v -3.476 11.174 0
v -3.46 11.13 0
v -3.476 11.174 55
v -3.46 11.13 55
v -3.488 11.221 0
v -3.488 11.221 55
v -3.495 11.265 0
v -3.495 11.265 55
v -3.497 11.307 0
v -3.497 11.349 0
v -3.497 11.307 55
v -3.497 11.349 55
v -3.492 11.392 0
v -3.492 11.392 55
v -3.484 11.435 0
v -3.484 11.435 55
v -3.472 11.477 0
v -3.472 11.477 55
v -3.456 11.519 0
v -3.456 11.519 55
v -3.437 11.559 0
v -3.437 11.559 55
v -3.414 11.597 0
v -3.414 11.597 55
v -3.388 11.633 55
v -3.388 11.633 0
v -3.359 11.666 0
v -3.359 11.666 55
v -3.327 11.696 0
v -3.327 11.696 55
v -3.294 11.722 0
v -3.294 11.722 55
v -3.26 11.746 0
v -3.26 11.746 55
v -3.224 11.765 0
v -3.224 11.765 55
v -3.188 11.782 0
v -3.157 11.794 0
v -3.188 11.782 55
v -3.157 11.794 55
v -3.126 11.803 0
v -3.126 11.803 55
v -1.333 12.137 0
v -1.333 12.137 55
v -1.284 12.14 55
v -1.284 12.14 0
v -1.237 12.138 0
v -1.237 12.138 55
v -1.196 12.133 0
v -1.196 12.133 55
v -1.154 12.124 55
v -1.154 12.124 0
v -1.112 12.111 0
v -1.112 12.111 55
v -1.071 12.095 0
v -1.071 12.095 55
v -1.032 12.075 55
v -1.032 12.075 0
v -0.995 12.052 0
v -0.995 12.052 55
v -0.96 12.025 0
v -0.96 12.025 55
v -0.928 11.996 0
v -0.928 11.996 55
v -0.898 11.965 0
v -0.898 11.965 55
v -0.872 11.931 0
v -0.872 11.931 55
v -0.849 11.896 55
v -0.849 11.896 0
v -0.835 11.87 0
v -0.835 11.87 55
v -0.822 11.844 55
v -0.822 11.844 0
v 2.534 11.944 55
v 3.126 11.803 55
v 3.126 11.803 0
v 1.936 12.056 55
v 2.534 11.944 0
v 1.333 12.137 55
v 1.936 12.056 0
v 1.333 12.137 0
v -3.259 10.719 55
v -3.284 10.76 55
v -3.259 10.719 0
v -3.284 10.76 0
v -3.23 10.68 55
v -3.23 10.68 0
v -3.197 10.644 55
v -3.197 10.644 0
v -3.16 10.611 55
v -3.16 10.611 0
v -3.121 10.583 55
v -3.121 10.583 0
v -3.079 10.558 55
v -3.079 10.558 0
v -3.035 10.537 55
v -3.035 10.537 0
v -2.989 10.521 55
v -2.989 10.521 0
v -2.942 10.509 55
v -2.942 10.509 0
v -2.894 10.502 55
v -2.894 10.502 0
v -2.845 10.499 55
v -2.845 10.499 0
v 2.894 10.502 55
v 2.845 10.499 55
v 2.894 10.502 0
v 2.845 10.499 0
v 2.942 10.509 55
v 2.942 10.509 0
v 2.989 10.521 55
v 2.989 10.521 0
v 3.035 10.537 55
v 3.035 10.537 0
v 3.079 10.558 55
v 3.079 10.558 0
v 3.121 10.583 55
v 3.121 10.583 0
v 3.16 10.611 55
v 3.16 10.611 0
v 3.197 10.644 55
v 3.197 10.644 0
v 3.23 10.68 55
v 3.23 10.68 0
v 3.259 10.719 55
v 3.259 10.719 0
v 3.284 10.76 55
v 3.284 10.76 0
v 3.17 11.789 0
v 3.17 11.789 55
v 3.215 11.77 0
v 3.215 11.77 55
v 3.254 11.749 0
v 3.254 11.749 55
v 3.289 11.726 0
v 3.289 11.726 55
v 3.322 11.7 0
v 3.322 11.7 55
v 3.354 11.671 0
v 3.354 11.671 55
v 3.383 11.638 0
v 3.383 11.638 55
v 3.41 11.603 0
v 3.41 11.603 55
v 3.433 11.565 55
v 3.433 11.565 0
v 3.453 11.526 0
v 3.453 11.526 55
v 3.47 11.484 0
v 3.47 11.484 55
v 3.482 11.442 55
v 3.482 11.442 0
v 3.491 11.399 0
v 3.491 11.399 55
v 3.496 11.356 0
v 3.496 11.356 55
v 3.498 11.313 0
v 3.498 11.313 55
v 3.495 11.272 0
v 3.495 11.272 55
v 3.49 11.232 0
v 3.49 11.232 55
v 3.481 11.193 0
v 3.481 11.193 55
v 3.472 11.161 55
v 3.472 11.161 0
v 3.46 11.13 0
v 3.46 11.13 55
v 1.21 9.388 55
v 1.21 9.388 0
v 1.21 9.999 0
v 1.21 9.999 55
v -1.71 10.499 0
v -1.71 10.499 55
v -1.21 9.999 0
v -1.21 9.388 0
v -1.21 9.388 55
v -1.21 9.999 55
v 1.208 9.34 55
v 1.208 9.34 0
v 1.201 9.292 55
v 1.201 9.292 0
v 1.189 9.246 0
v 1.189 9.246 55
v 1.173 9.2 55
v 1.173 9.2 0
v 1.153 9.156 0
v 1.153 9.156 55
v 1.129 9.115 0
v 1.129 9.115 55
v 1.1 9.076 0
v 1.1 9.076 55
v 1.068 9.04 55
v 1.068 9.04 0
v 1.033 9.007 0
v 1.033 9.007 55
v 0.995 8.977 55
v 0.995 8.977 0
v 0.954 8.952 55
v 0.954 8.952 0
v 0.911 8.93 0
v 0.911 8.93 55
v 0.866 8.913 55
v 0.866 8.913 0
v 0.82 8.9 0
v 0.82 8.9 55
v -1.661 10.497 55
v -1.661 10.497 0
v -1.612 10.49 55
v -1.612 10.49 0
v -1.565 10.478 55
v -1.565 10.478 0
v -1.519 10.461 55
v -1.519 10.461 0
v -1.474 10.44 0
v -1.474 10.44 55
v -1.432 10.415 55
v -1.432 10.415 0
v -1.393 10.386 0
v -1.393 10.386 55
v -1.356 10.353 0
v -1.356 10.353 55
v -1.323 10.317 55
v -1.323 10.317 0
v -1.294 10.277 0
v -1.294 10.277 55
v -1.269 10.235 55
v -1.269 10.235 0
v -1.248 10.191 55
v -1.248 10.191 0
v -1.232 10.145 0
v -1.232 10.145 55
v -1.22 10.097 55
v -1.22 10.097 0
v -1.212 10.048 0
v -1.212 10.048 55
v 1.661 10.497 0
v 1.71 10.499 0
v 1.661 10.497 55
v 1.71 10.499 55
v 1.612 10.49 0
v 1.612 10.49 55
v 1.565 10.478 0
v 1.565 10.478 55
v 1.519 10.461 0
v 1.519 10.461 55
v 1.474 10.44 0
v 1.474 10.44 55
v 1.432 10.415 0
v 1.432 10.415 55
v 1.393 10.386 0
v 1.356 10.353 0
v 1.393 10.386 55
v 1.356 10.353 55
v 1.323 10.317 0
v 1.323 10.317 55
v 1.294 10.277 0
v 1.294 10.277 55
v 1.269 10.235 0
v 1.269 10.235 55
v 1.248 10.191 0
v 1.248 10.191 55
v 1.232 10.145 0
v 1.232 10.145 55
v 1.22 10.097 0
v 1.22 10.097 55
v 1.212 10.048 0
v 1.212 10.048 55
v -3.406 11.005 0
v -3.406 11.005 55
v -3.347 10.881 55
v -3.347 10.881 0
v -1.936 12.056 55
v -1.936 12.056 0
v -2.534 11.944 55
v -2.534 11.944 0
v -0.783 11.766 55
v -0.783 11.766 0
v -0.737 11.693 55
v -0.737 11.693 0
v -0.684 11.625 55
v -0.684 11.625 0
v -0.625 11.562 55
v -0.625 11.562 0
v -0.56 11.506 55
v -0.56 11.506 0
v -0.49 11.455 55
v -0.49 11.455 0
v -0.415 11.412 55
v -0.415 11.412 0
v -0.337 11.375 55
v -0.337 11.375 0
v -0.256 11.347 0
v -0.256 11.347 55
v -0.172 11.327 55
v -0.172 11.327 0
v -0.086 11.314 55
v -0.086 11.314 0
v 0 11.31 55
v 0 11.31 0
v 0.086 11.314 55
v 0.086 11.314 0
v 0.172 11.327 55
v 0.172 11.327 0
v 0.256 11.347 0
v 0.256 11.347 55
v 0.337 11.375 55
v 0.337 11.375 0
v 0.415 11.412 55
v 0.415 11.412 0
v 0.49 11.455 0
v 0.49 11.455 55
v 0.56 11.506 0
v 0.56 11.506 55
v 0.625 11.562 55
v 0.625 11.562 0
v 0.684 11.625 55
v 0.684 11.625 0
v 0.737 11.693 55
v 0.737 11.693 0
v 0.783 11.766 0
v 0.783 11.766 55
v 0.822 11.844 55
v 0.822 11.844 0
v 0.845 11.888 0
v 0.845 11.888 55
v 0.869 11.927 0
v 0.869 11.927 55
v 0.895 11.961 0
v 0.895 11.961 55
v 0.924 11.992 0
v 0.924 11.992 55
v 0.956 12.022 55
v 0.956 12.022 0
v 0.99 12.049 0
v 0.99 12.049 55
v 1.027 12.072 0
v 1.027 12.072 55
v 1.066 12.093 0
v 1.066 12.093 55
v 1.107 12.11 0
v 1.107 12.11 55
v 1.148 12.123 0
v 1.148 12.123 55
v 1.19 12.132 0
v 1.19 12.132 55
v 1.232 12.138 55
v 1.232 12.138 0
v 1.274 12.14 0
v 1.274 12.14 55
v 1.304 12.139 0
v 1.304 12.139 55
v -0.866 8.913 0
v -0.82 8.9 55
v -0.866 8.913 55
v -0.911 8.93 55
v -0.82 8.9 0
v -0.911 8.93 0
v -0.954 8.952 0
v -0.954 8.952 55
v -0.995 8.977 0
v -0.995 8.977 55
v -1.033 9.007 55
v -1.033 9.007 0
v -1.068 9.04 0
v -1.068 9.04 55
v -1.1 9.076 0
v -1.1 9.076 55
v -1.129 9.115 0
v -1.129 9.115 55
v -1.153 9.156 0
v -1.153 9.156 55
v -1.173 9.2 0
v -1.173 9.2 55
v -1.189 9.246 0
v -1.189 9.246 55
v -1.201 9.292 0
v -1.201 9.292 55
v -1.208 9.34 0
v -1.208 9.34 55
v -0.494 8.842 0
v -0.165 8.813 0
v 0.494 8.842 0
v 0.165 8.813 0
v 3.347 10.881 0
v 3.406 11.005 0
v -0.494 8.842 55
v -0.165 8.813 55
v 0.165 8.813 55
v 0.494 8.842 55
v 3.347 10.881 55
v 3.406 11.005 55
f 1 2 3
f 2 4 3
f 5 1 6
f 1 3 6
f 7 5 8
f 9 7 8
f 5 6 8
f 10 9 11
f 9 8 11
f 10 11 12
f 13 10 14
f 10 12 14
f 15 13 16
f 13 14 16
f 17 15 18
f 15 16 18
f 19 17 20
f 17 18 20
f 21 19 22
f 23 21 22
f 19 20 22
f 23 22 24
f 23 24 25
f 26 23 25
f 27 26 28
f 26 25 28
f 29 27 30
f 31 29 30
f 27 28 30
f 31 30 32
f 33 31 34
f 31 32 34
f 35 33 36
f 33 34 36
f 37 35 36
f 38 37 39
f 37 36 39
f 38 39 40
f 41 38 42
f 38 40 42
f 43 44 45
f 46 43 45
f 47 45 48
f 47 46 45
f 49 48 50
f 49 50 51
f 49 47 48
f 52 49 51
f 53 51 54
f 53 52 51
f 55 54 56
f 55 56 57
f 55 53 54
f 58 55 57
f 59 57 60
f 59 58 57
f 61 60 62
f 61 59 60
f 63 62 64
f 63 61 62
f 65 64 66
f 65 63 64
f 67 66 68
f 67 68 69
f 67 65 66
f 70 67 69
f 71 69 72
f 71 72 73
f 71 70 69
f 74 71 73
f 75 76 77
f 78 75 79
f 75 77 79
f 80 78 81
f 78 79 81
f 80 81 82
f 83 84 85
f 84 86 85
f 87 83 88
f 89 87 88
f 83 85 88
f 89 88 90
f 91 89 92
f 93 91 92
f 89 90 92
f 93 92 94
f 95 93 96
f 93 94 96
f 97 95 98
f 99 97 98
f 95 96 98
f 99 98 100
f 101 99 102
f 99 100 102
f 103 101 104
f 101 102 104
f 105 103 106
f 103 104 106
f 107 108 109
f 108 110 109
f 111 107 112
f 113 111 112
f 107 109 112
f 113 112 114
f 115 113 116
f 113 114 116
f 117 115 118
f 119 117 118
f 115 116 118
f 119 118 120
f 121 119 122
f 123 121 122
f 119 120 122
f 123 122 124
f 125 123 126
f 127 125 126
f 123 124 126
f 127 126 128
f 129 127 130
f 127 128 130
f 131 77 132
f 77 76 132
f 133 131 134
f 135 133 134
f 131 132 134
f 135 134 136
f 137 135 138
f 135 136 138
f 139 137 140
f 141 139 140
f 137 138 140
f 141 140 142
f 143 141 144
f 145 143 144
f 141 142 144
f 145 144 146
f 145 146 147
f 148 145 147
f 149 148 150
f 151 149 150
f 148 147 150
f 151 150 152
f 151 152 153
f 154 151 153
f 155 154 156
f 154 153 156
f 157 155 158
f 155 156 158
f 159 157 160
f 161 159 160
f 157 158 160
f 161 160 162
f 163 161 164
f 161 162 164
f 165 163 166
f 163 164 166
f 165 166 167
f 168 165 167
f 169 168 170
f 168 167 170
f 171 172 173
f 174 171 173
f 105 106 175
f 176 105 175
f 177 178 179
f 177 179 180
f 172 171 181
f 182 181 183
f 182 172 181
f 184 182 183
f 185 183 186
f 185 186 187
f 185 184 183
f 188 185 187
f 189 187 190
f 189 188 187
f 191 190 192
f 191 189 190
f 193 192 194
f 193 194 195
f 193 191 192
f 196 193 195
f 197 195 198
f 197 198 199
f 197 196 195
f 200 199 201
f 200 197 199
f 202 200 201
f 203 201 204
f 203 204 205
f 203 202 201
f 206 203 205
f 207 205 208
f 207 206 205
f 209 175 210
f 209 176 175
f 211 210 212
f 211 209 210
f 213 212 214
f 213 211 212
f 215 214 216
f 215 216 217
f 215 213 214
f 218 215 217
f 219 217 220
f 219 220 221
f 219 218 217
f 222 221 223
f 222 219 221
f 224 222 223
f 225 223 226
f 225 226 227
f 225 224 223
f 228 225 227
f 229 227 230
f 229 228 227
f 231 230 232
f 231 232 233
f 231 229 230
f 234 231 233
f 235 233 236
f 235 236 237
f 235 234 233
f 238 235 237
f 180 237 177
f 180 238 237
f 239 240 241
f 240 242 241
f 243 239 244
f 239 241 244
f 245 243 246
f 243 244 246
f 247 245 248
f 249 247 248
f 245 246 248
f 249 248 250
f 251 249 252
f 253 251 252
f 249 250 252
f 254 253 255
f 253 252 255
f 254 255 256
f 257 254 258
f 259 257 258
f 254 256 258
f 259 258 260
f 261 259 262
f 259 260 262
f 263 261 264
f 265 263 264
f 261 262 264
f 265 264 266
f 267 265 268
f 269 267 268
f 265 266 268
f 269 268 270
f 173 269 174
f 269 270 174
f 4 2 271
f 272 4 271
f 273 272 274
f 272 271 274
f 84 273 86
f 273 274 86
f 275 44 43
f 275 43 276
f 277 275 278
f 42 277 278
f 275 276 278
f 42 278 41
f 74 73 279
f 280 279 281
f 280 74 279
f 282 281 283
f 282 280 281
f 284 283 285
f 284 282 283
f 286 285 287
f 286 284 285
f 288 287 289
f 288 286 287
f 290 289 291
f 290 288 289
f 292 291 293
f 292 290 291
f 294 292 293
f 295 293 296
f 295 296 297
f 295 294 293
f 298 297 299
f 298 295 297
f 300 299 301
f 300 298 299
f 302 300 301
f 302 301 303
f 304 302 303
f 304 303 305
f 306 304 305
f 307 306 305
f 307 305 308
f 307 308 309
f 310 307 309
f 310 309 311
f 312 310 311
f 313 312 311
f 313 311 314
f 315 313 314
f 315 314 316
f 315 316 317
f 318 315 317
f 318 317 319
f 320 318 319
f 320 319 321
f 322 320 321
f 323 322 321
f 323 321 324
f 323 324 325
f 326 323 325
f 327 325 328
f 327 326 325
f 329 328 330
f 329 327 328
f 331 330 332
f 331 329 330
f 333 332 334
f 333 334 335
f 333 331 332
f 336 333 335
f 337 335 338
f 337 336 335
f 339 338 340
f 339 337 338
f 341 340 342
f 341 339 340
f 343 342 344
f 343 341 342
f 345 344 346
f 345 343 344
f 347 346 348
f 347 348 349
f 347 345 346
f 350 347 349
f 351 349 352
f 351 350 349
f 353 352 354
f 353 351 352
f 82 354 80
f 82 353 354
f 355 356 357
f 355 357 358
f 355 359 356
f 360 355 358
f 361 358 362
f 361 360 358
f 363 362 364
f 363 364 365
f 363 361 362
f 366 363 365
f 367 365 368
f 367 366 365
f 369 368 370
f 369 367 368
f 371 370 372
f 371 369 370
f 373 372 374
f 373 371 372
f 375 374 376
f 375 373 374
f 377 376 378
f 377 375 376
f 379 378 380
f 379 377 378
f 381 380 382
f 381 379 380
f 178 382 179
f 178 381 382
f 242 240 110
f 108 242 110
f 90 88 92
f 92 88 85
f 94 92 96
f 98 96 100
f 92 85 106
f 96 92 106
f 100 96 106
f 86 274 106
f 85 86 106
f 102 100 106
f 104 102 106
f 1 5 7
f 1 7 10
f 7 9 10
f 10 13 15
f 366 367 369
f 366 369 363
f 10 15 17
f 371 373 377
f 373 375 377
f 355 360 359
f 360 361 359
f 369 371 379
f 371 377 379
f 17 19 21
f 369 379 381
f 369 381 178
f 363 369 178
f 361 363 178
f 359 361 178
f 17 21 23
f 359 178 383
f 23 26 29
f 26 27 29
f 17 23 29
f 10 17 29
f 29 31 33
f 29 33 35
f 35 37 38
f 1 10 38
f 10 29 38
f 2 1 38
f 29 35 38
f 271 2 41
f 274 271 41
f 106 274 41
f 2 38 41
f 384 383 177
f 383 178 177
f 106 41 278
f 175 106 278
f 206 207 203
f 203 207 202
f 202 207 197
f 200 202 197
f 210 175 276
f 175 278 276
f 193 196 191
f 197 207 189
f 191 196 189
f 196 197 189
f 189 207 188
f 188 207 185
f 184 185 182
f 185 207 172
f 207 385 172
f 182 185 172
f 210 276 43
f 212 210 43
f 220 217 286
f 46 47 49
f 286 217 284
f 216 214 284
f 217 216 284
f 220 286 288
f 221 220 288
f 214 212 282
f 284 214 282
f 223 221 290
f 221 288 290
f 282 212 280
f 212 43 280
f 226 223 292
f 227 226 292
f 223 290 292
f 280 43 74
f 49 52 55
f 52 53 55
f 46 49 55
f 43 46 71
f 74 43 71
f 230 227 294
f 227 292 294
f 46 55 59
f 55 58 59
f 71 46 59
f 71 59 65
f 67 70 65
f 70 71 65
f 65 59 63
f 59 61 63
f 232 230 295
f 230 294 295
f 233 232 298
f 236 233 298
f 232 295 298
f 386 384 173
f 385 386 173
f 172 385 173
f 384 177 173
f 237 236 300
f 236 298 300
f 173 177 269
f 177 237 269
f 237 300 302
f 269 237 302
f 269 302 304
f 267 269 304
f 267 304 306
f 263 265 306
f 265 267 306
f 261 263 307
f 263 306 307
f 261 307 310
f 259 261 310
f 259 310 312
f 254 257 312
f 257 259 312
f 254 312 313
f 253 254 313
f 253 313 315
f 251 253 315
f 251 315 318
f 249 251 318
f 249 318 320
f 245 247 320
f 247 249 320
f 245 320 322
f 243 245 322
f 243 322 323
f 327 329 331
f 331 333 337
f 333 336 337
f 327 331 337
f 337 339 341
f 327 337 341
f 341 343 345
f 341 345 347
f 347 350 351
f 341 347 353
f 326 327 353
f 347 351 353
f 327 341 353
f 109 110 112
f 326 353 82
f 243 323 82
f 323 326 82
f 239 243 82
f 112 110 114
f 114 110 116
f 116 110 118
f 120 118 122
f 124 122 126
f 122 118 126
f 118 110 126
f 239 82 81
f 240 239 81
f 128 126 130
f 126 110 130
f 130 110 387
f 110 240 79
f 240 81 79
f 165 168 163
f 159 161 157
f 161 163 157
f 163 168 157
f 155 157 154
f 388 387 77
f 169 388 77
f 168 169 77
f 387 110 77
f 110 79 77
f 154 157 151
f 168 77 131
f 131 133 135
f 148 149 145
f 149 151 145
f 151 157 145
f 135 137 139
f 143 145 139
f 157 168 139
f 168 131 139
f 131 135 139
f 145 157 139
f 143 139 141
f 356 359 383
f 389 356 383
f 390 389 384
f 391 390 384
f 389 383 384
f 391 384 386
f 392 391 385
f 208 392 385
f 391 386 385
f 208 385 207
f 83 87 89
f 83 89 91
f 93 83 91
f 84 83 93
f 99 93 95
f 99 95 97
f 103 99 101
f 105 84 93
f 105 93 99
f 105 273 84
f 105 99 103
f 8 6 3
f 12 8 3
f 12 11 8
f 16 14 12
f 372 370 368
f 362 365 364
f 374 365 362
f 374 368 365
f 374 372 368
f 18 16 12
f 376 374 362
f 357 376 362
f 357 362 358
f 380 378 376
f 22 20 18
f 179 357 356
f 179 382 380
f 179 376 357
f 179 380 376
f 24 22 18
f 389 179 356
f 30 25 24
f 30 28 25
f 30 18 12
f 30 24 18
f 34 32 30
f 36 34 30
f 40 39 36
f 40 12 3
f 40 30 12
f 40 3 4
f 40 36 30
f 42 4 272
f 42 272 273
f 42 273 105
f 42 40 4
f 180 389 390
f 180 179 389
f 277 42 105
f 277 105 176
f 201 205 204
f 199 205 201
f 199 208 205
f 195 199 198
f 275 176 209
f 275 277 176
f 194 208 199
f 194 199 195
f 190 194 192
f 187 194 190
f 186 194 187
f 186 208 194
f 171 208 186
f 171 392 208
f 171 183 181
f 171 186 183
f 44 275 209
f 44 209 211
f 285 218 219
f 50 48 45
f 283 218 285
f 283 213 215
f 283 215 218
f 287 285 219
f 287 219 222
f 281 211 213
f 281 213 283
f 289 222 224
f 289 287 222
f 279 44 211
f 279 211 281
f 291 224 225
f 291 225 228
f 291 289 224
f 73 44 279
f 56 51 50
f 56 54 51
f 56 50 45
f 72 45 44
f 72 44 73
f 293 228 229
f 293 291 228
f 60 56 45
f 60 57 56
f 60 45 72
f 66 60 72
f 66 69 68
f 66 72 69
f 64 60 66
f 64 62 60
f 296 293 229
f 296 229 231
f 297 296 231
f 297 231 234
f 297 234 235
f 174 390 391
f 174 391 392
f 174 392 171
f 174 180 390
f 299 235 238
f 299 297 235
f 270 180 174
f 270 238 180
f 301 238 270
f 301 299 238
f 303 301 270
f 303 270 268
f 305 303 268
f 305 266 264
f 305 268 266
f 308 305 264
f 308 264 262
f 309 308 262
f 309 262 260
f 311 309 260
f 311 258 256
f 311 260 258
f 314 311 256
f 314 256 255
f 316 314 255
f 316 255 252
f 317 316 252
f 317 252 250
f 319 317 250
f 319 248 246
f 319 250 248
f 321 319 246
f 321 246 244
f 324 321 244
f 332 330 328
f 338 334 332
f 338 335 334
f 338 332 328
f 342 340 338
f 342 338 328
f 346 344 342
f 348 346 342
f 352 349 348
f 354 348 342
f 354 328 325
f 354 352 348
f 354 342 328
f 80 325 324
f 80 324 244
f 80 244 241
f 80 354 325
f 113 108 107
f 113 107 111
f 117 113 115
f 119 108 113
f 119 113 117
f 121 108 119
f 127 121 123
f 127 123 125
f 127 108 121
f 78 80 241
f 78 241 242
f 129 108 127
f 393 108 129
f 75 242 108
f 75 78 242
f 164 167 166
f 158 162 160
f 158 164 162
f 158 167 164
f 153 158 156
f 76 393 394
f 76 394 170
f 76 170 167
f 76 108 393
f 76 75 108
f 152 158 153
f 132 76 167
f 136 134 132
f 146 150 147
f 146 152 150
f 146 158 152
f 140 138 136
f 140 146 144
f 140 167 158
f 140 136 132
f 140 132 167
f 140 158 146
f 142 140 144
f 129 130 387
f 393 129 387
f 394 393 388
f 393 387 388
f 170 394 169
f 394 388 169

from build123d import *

# Parameters (mm, degrees)
CYLINDER001_R     = 0.9
CYLINDER001_DEPTH = 55
BOX006_W          = 2.42
BOX006_H          = 1.69
BOX006_DEPTH      = 55
BOX005_W          = 2.42
BOX005_H          = 1.69
BOX005_DEPTH      = 55
EXTRUDE010_DEPTH  = 55
FILLET010_R       = 0.5


with BuildPart() as cilindro:
    # Cylinder001 → Cylinder001 (new body)
    with BuildSketch(Plane(origin=(0, 12.21, 0), x_dir=(1, 0, 0), z_dir=(0, 0, 1))):
        Circle(CYLINDER001_R)
    extrude(amount=CYLINDER001_DEPTH)


with BuildPart() as cubo_der:
    # Box006 → Box006 (new body)
    with BuildSketch(Plane(origin=(1.21, 8.809483, 0), x_dir=(1, 0, 0), z_dir=(0, 0, 1))):
        with Locations((1.21, 0.845)):
            Rectangle(BOX006_W, BOX006_H)
    extrude(amount=BOX006_DEPTH)


with BuildPart() as cubo_izq:
    # Box005 → Box005 (new body)
    with BuildSketch(Plane(origin=(-3.63, 8.809483, 0), x_dir=(1, 0, 0), z_dir=(0, 0, 1))):
        with Locations((1.21, 0.845)):
            Rectangle(BOX005_W, BOX005_H)
    extrude(amount=BOX005_DEPTH)


with BuildPart() as barrote_nuevo_final001:
    # Sketch009 → Extrude010 (new body)
    with BuildSketch(Plane.XY):
        with BuildLine():
            ThreePointArc((-3.632024, 11.657294), (0, 8.809483), (3.632024, 11.657294))
            ThreePointArc((3.632024, 11.657294), (0, 12.21), (-3.632024, 11.657294))
        make_face()
    extrude(amount=EXTRUDE010_DEPTH)

    # Cut004: cut Cubo izq
    add(cubo_izq.part, mode=Mode.SUBTRACT)

    # Cut005: cut Cubo der
    add(cubo_der.part, mode=Mode.SUBTRACT)

    # Cut006: cut Cilindro
    add(cilindro.part, mode=Mode.SUBTRACT)

    # Fillet010
    fillet010_edges = [barrote_nuevo_final001.edges().sort_by_distance(p)[0] for p in [
        (-3.128114, 10.499483, 27.5),
        (-3.632024, 11.657294, 27.5),
        (-1.21, 10.499483, 27.5),
        (-0.899389, 12.17683, 27.5),
        (3.128114, 10.499483, 27.5),
        (1.21, 10.499483, 27.5),
        (1.21, 9.010627, 27.5),
        (-1.21, 9.010627, 27.5),
        (0.899389, 12.17683, 27.5),
        (3.632024, 11.657294, 27.5),
    ]]
    fillet(fillet010_edges, radius=FILLET010_R)


solid = barrote_nuevo_final001.part
